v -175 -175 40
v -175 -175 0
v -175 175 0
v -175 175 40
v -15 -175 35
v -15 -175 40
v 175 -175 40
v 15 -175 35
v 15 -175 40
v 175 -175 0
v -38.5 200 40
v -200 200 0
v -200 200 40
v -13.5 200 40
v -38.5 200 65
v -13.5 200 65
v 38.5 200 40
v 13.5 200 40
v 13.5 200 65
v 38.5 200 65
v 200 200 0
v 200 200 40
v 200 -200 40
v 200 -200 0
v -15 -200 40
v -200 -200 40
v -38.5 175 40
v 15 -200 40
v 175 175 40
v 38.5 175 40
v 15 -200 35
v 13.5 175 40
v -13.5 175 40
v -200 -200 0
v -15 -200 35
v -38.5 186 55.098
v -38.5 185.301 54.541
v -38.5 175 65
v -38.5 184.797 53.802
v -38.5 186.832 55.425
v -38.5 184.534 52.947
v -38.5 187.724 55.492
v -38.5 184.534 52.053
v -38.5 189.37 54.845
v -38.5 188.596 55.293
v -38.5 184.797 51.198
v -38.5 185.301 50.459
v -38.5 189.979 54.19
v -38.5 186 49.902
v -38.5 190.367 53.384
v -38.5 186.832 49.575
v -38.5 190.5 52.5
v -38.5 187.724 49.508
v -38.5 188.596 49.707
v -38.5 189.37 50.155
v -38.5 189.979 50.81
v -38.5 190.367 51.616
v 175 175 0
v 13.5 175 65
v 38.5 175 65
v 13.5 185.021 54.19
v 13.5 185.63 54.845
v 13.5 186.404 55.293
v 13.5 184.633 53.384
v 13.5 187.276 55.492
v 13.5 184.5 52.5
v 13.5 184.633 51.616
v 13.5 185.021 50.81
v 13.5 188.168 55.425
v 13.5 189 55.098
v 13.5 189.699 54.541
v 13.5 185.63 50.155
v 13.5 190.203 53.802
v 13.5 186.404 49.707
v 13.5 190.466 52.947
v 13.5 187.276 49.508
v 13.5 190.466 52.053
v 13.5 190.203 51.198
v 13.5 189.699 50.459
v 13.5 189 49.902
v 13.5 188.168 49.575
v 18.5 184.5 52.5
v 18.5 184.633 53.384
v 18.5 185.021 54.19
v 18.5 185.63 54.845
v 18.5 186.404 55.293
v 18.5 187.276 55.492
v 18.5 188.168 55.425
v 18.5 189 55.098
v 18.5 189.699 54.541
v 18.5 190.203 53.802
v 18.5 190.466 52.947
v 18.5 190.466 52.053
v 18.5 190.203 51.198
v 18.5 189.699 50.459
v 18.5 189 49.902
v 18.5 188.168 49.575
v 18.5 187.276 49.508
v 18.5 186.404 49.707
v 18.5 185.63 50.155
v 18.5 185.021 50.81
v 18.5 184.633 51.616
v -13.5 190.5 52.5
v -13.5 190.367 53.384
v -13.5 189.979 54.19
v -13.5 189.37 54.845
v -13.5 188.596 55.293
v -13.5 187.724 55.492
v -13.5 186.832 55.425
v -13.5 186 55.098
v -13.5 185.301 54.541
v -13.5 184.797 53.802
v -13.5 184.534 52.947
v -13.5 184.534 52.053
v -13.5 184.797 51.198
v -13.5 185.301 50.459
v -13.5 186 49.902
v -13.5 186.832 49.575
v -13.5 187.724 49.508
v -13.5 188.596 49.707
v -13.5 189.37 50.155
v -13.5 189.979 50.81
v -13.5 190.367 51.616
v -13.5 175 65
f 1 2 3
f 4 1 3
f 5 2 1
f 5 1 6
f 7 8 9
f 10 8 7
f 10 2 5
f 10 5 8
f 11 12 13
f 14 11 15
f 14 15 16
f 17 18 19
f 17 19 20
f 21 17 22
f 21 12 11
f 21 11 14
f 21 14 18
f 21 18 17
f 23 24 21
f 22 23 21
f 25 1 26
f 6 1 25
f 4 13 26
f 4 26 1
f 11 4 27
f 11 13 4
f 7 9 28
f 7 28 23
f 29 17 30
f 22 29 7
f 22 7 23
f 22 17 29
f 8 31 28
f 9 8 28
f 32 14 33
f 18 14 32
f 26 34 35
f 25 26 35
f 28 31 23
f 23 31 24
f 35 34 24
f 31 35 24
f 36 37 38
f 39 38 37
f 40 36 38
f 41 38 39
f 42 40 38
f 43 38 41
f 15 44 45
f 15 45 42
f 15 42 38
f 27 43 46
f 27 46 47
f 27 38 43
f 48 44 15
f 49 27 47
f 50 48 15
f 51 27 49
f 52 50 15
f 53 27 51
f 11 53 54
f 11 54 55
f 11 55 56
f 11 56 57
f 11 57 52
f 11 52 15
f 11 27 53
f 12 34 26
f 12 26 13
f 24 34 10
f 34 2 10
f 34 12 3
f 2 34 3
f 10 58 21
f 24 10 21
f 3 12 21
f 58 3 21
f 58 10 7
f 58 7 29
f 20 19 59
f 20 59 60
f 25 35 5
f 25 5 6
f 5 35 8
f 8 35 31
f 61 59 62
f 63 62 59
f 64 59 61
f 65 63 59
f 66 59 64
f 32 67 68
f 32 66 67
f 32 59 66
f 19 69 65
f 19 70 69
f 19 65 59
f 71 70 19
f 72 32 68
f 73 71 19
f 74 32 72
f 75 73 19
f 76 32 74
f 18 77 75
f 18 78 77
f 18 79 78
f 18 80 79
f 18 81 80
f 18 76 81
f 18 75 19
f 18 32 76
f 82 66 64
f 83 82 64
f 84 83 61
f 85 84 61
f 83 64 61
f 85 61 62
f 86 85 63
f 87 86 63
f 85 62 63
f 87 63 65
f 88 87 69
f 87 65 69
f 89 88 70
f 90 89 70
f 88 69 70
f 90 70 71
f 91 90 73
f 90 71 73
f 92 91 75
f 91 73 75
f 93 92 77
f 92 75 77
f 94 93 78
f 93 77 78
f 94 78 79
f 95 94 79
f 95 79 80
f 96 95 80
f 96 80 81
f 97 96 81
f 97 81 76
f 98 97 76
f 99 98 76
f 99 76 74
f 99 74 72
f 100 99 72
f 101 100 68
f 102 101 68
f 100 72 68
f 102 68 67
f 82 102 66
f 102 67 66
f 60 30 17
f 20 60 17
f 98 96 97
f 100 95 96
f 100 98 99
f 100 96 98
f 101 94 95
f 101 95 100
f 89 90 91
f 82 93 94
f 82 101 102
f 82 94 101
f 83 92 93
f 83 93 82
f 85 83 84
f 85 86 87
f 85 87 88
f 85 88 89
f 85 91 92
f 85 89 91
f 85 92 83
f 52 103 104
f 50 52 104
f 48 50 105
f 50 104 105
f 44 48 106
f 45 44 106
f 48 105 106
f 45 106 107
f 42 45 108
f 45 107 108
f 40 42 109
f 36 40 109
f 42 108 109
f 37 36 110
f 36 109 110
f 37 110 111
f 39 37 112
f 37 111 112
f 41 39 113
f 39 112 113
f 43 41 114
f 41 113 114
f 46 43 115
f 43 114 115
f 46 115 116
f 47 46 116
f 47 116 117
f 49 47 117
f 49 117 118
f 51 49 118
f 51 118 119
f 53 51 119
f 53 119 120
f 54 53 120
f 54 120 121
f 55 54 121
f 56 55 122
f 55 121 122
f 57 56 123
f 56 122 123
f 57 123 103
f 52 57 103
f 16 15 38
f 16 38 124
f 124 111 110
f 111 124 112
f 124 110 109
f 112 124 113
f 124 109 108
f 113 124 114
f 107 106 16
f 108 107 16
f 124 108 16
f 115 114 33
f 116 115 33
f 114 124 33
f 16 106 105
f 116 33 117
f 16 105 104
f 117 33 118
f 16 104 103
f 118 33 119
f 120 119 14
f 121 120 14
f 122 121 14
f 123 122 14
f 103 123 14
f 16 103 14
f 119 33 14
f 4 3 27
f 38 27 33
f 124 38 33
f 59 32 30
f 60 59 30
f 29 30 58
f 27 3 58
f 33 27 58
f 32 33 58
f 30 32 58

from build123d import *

# Parameters (mm, degrees)
F0_W     = 400
F0_H     = 400
F0_W_2   = 350
F0_H_2   = 350
F1_DEPTH = 40
F2_W     = 30
F2_H     = 5
F3_DEPTH = 25
F4_W     = 25
F4_H     = 25
F5_DEPTH = 25
F6_R     = 3
F7_DEPTH = 5
F8_R     = 3
F9_DEPTH = 25


with BuildPart() as f1:
    # F0 (on Top) → F1 (new body)
    with BuildSketch(Plane.XY):
        Rectangle(F0_W, F0_H)
        Rectangle(F0_W_2, F0_H_2, mode=Mode.SUBTRACT)
    extrude(amount=F1_DEPTH)

    # F2 (on face) → F3 (cut, through all)
    with BuildSketch(Plane.XZ.offset(200)):
        with Locations((0, 37.5)):
            Rectangle(F2_W, F2_H)
    extrude(amount=-F3_DEPTH, mode=Mode.SUBTRACT)

    # F4 (on face) → F5 (join)
    with BuildSketch(Plane.XY.offset(40)):
        with Locations((-26, 187.5)):
            Rectangle(F4_W, F4_H)
        with Locations((26, 187.5)):
            Rectangle(F4_W, F4_H)
    extrude(amount=F5_DEPTH)

    # F6 (on face) → F7 (cut)
    with BuildSketch(Plane(origin=(13.5, 0, 0), x_dir=(0, -1, 0), z_dir=(-1, 0, 0))):
        with Locations((-187.5, 52.5)):
            Circle(F6_R)
    extrude(amount=-F7_DEPTH, mode=Mode.SUBTRACT)

    # F8 (on face) → F9 (cut, through all)
    with BuildSketch(Plane.YZ.offset(-13.5)):
        with Locations((187.5, 52.5)):
            Circle(F8_R)
    extrude(amount=-F9_DEPTH, mode=Mode.SUBTRACT)


solid = f1.part
